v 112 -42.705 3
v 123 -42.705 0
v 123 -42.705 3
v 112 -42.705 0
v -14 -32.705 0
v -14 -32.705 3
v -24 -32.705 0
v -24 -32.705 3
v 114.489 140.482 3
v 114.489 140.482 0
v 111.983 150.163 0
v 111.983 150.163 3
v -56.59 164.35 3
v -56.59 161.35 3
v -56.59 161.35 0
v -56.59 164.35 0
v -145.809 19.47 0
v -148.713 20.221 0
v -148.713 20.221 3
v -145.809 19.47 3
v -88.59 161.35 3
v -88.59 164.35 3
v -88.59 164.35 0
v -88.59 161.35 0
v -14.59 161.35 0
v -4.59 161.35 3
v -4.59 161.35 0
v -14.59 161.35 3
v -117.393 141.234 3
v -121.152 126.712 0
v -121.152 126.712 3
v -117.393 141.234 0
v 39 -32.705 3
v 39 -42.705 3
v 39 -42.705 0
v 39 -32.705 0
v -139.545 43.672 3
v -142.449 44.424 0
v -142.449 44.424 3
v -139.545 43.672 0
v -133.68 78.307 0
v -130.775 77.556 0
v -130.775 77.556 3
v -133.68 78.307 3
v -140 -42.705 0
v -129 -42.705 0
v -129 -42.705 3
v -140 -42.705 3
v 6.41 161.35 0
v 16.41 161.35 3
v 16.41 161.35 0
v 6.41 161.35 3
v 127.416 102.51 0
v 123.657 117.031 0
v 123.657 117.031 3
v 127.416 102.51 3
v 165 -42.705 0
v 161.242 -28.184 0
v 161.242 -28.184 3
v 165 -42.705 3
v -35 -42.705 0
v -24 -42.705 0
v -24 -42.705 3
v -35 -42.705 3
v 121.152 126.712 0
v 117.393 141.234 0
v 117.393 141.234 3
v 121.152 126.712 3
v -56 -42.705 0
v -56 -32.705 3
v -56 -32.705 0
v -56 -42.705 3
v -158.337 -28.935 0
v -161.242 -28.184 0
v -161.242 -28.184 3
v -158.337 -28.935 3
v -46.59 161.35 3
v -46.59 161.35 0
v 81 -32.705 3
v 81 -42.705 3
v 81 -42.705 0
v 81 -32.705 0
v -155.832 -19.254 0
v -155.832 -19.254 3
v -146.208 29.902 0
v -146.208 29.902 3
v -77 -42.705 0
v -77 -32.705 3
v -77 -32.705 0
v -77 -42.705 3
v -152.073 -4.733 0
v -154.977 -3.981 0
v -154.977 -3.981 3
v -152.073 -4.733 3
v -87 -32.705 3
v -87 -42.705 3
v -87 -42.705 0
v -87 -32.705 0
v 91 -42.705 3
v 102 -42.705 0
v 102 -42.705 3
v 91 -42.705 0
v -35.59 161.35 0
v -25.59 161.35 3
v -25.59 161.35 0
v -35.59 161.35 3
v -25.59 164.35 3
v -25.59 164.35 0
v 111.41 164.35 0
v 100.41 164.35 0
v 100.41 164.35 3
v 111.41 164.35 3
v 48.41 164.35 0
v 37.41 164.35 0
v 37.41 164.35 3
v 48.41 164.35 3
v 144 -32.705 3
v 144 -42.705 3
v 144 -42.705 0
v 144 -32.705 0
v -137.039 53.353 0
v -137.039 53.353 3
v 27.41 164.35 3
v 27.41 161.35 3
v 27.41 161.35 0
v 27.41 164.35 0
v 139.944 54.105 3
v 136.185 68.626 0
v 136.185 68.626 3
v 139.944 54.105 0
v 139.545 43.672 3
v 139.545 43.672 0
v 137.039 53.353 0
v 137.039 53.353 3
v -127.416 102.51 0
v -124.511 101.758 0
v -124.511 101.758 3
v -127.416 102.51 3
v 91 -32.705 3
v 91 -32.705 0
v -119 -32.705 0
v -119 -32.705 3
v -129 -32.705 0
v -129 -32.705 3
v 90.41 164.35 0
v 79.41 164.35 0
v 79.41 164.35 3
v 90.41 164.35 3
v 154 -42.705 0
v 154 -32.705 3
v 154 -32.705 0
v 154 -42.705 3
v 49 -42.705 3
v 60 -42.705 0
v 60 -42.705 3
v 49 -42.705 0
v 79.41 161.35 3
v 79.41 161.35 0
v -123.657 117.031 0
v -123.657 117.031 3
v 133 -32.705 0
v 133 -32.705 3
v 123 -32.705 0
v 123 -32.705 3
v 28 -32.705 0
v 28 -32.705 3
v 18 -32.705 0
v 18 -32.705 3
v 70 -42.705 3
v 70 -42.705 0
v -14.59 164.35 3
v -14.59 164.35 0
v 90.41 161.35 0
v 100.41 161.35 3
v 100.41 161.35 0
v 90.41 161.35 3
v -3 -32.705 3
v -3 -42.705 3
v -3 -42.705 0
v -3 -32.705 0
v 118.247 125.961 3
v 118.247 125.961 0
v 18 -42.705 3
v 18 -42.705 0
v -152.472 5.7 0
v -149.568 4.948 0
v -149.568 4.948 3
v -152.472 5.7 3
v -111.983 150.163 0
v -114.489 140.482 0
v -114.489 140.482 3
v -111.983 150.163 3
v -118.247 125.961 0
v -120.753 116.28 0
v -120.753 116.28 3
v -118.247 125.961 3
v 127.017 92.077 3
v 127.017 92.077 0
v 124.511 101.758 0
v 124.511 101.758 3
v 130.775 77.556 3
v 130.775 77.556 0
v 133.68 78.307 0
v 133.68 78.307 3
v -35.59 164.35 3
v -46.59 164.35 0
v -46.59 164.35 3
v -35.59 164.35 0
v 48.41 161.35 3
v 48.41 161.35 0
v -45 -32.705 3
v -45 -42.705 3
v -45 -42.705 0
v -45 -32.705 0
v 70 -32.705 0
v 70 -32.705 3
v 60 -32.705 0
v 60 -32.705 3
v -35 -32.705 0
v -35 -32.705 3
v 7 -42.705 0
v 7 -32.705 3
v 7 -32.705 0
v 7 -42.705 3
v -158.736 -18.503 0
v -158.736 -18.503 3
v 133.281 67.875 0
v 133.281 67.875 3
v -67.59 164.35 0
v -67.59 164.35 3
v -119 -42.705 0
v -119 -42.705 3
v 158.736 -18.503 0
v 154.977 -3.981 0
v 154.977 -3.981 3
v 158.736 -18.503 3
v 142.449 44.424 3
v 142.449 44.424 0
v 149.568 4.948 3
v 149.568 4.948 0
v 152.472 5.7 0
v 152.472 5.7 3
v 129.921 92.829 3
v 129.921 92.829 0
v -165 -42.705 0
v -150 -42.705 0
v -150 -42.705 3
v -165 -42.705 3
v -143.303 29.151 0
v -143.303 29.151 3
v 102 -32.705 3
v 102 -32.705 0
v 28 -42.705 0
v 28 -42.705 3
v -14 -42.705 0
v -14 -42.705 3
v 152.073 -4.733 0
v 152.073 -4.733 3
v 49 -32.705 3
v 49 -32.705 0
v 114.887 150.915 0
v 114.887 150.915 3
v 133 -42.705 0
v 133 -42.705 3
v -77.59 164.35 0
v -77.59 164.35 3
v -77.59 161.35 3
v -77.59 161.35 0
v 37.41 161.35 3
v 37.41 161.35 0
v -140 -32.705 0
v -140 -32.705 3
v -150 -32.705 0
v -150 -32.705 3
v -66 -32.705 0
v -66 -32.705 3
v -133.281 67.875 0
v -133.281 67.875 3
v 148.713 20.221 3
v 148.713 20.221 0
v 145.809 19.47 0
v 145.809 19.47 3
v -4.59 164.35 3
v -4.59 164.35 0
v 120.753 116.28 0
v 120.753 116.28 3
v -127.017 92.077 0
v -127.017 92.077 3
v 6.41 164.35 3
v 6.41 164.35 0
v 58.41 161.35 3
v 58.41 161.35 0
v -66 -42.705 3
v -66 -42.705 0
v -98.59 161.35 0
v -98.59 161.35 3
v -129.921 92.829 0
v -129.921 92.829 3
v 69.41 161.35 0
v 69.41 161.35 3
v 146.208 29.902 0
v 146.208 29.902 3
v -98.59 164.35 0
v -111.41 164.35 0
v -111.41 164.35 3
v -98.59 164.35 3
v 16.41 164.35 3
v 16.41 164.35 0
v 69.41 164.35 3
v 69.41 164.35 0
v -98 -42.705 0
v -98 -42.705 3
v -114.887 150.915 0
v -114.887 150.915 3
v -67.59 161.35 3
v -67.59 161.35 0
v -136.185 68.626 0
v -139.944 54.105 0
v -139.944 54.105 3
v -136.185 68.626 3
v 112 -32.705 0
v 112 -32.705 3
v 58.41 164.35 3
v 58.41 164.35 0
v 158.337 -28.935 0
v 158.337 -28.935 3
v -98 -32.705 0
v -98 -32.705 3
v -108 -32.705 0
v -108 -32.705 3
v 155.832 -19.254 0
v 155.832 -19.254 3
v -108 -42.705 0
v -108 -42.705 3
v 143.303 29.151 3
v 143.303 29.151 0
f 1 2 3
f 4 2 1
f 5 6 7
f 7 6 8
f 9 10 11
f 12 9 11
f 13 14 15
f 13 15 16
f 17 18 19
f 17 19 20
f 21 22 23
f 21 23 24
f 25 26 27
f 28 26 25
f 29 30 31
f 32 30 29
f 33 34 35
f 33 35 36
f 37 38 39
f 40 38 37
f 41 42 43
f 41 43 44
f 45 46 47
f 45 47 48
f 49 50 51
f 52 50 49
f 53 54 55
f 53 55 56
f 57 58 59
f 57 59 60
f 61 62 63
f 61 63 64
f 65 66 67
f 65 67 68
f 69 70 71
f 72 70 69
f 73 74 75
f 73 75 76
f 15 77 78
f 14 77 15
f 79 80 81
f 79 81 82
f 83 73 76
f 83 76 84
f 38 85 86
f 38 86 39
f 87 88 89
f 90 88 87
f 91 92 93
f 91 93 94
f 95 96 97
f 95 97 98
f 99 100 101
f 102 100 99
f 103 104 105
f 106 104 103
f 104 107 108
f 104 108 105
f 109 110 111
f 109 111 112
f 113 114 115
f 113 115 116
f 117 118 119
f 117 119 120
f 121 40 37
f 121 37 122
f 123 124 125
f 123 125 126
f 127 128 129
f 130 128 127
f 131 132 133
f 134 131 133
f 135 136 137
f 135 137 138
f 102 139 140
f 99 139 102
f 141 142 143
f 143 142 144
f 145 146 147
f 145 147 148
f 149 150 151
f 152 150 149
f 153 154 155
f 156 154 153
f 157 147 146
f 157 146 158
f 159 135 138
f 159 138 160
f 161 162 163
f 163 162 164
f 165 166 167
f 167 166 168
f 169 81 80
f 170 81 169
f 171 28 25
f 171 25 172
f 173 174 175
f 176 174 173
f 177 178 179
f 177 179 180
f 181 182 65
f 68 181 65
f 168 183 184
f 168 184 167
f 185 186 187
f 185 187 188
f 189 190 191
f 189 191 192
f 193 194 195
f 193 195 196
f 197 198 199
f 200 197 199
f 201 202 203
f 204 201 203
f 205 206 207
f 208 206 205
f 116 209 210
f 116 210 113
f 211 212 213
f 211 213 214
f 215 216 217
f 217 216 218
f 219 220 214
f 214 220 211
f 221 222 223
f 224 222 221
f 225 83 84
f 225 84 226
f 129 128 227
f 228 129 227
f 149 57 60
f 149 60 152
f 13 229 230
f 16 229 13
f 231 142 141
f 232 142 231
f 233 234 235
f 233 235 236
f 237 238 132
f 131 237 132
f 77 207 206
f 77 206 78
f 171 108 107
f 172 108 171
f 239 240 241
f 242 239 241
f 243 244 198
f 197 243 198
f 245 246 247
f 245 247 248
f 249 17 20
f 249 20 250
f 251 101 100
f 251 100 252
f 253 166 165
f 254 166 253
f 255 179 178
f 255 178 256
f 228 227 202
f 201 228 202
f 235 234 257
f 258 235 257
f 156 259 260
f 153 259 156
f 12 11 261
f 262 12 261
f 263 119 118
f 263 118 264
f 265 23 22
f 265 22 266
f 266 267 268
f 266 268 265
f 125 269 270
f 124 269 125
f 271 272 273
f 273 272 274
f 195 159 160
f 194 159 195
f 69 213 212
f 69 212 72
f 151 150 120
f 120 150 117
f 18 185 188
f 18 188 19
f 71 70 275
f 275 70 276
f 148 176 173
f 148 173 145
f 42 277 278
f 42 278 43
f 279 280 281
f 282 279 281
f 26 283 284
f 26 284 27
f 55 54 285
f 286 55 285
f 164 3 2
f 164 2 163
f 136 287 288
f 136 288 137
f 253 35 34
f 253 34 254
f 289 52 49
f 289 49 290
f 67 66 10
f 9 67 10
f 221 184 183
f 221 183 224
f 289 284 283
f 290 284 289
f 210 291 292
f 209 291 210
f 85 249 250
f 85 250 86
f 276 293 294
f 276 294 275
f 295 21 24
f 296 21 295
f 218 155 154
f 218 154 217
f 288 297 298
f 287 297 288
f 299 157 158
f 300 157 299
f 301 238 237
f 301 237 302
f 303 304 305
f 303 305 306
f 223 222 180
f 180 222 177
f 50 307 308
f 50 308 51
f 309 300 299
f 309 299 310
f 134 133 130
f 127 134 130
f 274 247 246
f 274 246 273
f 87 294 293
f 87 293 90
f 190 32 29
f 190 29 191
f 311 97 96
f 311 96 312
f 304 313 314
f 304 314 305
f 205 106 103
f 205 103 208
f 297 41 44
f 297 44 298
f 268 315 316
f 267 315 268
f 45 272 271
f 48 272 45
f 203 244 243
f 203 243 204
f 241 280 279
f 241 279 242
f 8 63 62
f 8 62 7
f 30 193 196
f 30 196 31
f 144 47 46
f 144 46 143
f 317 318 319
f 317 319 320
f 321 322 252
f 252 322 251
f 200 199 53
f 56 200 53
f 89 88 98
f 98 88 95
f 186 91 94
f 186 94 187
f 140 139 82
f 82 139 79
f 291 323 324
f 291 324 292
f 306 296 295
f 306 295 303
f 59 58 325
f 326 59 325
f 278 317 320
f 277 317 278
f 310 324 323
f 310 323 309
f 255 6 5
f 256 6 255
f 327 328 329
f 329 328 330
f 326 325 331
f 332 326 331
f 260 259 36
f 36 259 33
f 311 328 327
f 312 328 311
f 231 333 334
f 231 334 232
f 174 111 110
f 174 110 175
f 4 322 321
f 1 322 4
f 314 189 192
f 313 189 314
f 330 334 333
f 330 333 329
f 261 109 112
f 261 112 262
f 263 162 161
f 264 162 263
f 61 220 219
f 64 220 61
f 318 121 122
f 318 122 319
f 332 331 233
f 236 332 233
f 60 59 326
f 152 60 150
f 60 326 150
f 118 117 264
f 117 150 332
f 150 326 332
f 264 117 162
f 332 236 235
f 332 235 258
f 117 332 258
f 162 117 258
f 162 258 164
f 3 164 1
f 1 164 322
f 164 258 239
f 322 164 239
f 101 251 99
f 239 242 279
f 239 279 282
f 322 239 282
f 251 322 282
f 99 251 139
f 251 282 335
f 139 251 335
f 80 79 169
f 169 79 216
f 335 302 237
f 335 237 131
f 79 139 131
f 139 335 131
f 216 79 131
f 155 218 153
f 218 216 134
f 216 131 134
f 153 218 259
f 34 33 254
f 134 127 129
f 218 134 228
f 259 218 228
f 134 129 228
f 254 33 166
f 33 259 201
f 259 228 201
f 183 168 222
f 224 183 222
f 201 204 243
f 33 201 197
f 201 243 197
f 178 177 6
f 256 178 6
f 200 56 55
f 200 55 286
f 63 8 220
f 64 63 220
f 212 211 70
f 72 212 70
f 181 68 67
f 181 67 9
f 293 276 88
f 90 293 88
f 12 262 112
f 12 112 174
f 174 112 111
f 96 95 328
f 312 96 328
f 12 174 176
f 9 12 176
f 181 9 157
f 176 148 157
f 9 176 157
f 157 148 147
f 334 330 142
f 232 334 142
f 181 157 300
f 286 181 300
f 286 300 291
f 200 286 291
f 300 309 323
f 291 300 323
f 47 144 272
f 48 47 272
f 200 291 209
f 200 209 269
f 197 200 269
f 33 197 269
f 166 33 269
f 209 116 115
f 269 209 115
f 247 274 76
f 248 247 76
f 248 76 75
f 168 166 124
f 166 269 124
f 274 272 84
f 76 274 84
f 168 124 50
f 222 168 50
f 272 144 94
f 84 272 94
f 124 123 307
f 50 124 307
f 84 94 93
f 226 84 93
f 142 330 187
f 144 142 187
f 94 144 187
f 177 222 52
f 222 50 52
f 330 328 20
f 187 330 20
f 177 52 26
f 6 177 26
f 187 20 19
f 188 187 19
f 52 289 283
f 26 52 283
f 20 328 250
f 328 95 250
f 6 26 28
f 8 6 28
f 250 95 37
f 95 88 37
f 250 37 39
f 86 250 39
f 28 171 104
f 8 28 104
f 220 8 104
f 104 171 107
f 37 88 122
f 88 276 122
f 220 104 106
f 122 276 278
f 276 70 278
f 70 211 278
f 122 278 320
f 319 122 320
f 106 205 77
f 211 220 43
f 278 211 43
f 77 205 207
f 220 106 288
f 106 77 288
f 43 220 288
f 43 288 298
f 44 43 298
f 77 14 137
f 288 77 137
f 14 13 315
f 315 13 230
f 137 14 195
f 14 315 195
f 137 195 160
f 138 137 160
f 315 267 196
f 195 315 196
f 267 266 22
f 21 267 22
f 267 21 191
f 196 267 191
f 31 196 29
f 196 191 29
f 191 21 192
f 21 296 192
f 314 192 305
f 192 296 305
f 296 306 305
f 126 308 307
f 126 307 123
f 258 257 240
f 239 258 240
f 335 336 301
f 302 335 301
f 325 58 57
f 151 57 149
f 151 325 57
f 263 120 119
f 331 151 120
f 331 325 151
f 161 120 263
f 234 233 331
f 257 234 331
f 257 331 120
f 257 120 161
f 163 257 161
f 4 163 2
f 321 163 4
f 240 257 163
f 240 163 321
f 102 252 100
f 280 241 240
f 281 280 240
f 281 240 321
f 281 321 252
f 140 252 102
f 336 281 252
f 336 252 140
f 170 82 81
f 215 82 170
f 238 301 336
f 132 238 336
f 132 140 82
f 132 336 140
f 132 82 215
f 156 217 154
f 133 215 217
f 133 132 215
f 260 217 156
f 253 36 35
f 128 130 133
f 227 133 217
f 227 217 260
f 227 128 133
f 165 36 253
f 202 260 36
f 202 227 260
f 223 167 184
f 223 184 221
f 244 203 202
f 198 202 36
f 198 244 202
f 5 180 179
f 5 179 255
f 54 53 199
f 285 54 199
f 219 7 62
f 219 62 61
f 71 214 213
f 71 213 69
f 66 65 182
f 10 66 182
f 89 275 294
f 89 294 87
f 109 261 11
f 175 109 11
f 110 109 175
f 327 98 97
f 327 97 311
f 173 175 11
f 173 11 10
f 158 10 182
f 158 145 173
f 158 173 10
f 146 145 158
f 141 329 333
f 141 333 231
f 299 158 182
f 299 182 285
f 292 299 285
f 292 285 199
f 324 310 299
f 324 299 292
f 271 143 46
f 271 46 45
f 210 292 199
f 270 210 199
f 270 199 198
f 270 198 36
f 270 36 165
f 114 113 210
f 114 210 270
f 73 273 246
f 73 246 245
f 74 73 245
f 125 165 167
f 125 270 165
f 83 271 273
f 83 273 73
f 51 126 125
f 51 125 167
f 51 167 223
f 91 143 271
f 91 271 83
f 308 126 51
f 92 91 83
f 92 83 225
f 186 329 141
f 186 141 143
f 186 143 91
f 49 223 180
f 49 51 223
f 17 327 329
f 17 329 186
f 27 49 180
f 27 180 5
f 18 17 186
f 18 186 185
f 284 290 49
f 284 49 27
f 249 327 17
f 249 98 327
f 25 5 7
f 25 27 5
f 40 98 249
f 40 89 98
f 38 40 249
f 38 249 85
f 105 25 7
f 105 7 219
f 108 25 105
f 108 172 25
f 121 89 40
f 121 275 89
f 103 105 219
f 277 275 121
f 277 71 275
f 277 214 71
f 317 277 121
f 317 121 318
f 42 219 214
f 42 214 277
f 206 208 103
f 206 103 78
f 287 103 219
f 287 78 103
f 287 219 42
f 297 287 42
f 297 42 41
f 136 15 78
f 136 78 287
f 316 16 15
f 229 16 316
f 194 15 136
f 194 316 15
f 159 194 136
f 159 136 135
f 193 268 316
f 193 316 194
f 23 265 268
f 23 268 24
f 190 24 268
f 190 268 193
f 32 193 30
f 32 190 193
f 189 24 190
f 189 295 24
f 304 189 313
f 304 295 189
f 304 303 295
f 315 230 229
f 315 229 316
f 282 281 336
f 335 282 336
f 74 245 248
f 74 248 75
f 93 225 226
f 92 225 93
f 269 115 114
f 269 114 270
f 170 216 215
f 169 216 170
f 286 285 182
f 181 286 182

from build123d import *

# Parameters (mm, degrees)
BOSS_EXTRUDE1_DEPTH  = 3
CUT_EXTRUDE1_DEPTH   = 3
LPATTERN1_COUNT      = 8
LPATTERN1_PITCH      = 25
MIRROR1_COPY_1_DEPTH = 3
MIRROR1_COPY_2_DEPTH = 3
MIRROR1_COPY_3_DEPTH = 3
MIRROR1_COPY_4_DEPTH = 3
MIRROR1_COPY_5_DEPTH = 3
MIRROR1_COPY_6_DEPTH = 3
MIRROR1_COPY_7_DEPTH = 3
CUT_EXTRUDE3_START   = -3
CUT_EXTRUDE3_DEPTH   = 236.905459961
LPATTERN2_COUNT      = 15
LPATTERN2_PITCH      = 21
CUT_EXTRUDE5_START   = -3
CUT_EXTRUDE5_DEPTH   = 236.905459961
LPATTERN3_COUNT      = 10
LPATTERN3_PITCH      = 21


with BuildPart() as part:
    # Sketch2 → Boss-Extrude1 (new body)
    with BuildSketch(Plane.XY):
        Polygon((-111.410161514, 164.35009364), (111.410161514, 164.35009364), (165, -42.705142442), (-165, -42.705142442), align=None)
    extrude(amount=BOSS_EXTRUDE1_DEPTH)

    # Sketch3 → Cut-Extrude1 (cut)
    with BuildSketch(Plane(origin=(0, 0, 0), x_dir=(-1, 0, 0), z_dir=(0, 0, -1))):
        Polygon((-161.241557894, -28.183637254), (-158.337256856, -28.935325675), (-155.831628785, -19.254322216), (-158.735929823, -18.502633795), align=None)
    cut_extrude1 = extrude(amount=-CUT_EXTRUDE1_DEPTH, mode=Mode.SUBTRACT)

    # LPattern1: Cut-Extrude1 ×8
    with Locations(*[Vector(-0.25056280708573136, 0.9681003458863748, 0) * (i * LPATTERN1_PITCH) for i in range(1, LPATTERN1_COUNT)]):
        add(cut_extrude1, mode=Mode.SUBTRACT)

    # Mirror1: Cut-Extrude1 across plane
    add(cut_extrude1.mirror(Plane(origin=(0, 0, 0), x_dir=(0, 0, 1), z_dir=(1, 0, 0))), mode=Mode.SUBTRACT)

    # Mirror1 copy 1 sketch → Mirror1 copy 1 (cut)
    with BuildSketch(Plane(origin=(6.264070177, 24.202508647, 0), x_dir=(1, 0, 0), z_dir=(0, 0, -1))):
        Polygon((-161.241557894, 28.183637254), (-158.337256856, 28.935325675), (-155.831628785, 19.254322216), (-158.735929823, 18.502633795), align=None)
    extrude(amount=-MIRROR1_COPY_1_DEPTH, mode=Mode.SUBTRACT)

    # Mirror1 copy 2 sketch → Mirror1 copy 2 (cut)
    with BuildSketch(Plane(origin=(12.528140354, 48.405017294, 0), x_dir=(1, 0, 0), z_dir=(0, 0, -1))):
        Polygon((-161.241557894, 28.183637254), (-158.337256856, 28.935325675), (-155.831628785, 19.254322216), (-158.735929823, 18.502633795), align=None)
    extrude(amount=-MIRROR1_COPY_2_DEPTH, mode=Mode.SUBTRACT)

    # Mirror1 copy 3 sketch → Mirror1 copy 3 (cut)
    with BuildSketch(Plane(origin=(18.792210531, 72.607525941, 0), x_dir=(1, 0, 0), z_dir=(0, 0, -1))):
        Polygon((-161.241557894, 28.183637254), (-158.337256856, 28.935325675), (-155.831628785, 19.254322216), (-158.735929823, 18.502633795), align=None)
    extrude(amount=-MIRROR1_COPY_3_DEPTH, mode=Mode.SUBTRACT)

    # Mirror1 copy 4 sketch → Mirror1 copy 4 (cut)
    with BuildSketch(Plane(origin=(25.056280709, 96.810034589, 0), x_dir=(1, 0, 0), z_dir=(0, 0, -1))):
        Polygon((-161.241557894, 28.183637254), (-158.337256856, 28.935325675), (-155.831628785, 19.254322216), (-158.735929823, 18.502633795), align=None)
    extrude(amount=-MIRROR1_COPY_4_DEPTH, mode=Mode.SUBTRACT)

    # Mirror1 copy 5 sketch → Mirror1 copy 5 (cut)
    with BuildSketch(Plane(origin=(31.320350886, 121.012543236, 0), x_dir=(1, 0, 0), z_dir=(0, 0, -1))):
        Polygon((-161.241557894, 28.183637254), (-158.337256856, 28.935325675), (-155.831628785, 19.254322216), (-158.735929823, 18.502633795), align=None)
    extrude(amount=-MIRROR1_COPY_5_DEPTH, mode=Mode.SUBTRACT)

    # Mirror1 copy 6 sketch → Mirror1 copy 6 (cut)
    with BuildSketch(Plane(origin=(37.584421063, 145.215051883, 0), x_dir=(1, 0, 0), z_dir=(0, 0, -1))):
        Polygon((-161.241557894, 28.183637254), (-158.337256856, 28.935325675), (-155.831628785, 19.254322216), (-158.735929823, 18.502633795), align=None)
    extrude(amount=-MIRROR1_COPY_6_DEPTH, mode=Mode.SUBTRACT)

    # Mirror1 copy 7 sketch → Mirror1 copy 7 (cut)
    with BuildSketch(Plane(origin=(43.84849124, 169.41756053, 0), x_dir=(1, 0, 0), z_dir=(0, 0, -1))):
        Polygon((-161.241557894, 28.183637254), (-158.337256856, 28.935325675), (-155.831628785, 19.254322216), (-158.735929823, 18.502633795), align=None)
    extrude(amount=-MIRROR1_COPY_7_DEPTH, mode=Mode.SUBTRACT)

    # Sketch4 → Cut-Extrude3 (cut)
    with BuildSketch(Plane(origin=(0, 0, 0), x_dir=(-1, 0, 0), z_dir=(0, 0, -1)).offset(CUT_EXTRUDE3_START)):
        Polygon((-154, -813.317713437), (-154, -42.705142442), (-154, -32.705142442), (-144, -32.705142442), (-144, -42.705142442), (-144, -813.317713437), (-144, -2354.542855427), (-154, -2354.542855427), align=None)
    cut_extrude3 = extrude(amount=CUT_EXTRUDE3_DEPTH, mode=Mode.SUBTRACT)

    # LPattern2: Cut-Extrude3 ×15
    with Locations(*[(-i * LPATTERN2_PITCH, 0, 0) for i in range(1, LPATTERN2_COUNT)]):
        add(cut_extrude3, mode=Mode.SUBTRACT)

    # Sketch5 → Cut-Extrude5 (cut)
    with BuildSketch(Plane(origin=(0, 0, 0), x_dir=(-1, 0, 0), z_dir=(0, 0, -1)).offset(CUT_EXTRUDE5_START)):
        Polygon((-100.410161514, 847.594253284), (-100.410161514, 164.35009364), (-100.410161514, 161.35009364), (-90.410161514, 161.35009364), (-90.410161514, 164.35009364), (-90.410161514, 847.594253284), (-90.410161514, 2214.082572573), (-100.410161514, 2214.082572573), align=None)
    cut_extrude5 = extrude(amount=CUT_EXTRUDE5_DEPTH, mode=Mode.SUBTRACT)

    # LPattern3: Cut-Extrude5 ×10
    with Locations(*[(-i * LPATTERN3_PITCH, 0, 0) for i in range(1, LPATTERN3_COUNT)]):
        add(cut_extrude5, mode=Mode.SUBTRACT)


solid = part.part
